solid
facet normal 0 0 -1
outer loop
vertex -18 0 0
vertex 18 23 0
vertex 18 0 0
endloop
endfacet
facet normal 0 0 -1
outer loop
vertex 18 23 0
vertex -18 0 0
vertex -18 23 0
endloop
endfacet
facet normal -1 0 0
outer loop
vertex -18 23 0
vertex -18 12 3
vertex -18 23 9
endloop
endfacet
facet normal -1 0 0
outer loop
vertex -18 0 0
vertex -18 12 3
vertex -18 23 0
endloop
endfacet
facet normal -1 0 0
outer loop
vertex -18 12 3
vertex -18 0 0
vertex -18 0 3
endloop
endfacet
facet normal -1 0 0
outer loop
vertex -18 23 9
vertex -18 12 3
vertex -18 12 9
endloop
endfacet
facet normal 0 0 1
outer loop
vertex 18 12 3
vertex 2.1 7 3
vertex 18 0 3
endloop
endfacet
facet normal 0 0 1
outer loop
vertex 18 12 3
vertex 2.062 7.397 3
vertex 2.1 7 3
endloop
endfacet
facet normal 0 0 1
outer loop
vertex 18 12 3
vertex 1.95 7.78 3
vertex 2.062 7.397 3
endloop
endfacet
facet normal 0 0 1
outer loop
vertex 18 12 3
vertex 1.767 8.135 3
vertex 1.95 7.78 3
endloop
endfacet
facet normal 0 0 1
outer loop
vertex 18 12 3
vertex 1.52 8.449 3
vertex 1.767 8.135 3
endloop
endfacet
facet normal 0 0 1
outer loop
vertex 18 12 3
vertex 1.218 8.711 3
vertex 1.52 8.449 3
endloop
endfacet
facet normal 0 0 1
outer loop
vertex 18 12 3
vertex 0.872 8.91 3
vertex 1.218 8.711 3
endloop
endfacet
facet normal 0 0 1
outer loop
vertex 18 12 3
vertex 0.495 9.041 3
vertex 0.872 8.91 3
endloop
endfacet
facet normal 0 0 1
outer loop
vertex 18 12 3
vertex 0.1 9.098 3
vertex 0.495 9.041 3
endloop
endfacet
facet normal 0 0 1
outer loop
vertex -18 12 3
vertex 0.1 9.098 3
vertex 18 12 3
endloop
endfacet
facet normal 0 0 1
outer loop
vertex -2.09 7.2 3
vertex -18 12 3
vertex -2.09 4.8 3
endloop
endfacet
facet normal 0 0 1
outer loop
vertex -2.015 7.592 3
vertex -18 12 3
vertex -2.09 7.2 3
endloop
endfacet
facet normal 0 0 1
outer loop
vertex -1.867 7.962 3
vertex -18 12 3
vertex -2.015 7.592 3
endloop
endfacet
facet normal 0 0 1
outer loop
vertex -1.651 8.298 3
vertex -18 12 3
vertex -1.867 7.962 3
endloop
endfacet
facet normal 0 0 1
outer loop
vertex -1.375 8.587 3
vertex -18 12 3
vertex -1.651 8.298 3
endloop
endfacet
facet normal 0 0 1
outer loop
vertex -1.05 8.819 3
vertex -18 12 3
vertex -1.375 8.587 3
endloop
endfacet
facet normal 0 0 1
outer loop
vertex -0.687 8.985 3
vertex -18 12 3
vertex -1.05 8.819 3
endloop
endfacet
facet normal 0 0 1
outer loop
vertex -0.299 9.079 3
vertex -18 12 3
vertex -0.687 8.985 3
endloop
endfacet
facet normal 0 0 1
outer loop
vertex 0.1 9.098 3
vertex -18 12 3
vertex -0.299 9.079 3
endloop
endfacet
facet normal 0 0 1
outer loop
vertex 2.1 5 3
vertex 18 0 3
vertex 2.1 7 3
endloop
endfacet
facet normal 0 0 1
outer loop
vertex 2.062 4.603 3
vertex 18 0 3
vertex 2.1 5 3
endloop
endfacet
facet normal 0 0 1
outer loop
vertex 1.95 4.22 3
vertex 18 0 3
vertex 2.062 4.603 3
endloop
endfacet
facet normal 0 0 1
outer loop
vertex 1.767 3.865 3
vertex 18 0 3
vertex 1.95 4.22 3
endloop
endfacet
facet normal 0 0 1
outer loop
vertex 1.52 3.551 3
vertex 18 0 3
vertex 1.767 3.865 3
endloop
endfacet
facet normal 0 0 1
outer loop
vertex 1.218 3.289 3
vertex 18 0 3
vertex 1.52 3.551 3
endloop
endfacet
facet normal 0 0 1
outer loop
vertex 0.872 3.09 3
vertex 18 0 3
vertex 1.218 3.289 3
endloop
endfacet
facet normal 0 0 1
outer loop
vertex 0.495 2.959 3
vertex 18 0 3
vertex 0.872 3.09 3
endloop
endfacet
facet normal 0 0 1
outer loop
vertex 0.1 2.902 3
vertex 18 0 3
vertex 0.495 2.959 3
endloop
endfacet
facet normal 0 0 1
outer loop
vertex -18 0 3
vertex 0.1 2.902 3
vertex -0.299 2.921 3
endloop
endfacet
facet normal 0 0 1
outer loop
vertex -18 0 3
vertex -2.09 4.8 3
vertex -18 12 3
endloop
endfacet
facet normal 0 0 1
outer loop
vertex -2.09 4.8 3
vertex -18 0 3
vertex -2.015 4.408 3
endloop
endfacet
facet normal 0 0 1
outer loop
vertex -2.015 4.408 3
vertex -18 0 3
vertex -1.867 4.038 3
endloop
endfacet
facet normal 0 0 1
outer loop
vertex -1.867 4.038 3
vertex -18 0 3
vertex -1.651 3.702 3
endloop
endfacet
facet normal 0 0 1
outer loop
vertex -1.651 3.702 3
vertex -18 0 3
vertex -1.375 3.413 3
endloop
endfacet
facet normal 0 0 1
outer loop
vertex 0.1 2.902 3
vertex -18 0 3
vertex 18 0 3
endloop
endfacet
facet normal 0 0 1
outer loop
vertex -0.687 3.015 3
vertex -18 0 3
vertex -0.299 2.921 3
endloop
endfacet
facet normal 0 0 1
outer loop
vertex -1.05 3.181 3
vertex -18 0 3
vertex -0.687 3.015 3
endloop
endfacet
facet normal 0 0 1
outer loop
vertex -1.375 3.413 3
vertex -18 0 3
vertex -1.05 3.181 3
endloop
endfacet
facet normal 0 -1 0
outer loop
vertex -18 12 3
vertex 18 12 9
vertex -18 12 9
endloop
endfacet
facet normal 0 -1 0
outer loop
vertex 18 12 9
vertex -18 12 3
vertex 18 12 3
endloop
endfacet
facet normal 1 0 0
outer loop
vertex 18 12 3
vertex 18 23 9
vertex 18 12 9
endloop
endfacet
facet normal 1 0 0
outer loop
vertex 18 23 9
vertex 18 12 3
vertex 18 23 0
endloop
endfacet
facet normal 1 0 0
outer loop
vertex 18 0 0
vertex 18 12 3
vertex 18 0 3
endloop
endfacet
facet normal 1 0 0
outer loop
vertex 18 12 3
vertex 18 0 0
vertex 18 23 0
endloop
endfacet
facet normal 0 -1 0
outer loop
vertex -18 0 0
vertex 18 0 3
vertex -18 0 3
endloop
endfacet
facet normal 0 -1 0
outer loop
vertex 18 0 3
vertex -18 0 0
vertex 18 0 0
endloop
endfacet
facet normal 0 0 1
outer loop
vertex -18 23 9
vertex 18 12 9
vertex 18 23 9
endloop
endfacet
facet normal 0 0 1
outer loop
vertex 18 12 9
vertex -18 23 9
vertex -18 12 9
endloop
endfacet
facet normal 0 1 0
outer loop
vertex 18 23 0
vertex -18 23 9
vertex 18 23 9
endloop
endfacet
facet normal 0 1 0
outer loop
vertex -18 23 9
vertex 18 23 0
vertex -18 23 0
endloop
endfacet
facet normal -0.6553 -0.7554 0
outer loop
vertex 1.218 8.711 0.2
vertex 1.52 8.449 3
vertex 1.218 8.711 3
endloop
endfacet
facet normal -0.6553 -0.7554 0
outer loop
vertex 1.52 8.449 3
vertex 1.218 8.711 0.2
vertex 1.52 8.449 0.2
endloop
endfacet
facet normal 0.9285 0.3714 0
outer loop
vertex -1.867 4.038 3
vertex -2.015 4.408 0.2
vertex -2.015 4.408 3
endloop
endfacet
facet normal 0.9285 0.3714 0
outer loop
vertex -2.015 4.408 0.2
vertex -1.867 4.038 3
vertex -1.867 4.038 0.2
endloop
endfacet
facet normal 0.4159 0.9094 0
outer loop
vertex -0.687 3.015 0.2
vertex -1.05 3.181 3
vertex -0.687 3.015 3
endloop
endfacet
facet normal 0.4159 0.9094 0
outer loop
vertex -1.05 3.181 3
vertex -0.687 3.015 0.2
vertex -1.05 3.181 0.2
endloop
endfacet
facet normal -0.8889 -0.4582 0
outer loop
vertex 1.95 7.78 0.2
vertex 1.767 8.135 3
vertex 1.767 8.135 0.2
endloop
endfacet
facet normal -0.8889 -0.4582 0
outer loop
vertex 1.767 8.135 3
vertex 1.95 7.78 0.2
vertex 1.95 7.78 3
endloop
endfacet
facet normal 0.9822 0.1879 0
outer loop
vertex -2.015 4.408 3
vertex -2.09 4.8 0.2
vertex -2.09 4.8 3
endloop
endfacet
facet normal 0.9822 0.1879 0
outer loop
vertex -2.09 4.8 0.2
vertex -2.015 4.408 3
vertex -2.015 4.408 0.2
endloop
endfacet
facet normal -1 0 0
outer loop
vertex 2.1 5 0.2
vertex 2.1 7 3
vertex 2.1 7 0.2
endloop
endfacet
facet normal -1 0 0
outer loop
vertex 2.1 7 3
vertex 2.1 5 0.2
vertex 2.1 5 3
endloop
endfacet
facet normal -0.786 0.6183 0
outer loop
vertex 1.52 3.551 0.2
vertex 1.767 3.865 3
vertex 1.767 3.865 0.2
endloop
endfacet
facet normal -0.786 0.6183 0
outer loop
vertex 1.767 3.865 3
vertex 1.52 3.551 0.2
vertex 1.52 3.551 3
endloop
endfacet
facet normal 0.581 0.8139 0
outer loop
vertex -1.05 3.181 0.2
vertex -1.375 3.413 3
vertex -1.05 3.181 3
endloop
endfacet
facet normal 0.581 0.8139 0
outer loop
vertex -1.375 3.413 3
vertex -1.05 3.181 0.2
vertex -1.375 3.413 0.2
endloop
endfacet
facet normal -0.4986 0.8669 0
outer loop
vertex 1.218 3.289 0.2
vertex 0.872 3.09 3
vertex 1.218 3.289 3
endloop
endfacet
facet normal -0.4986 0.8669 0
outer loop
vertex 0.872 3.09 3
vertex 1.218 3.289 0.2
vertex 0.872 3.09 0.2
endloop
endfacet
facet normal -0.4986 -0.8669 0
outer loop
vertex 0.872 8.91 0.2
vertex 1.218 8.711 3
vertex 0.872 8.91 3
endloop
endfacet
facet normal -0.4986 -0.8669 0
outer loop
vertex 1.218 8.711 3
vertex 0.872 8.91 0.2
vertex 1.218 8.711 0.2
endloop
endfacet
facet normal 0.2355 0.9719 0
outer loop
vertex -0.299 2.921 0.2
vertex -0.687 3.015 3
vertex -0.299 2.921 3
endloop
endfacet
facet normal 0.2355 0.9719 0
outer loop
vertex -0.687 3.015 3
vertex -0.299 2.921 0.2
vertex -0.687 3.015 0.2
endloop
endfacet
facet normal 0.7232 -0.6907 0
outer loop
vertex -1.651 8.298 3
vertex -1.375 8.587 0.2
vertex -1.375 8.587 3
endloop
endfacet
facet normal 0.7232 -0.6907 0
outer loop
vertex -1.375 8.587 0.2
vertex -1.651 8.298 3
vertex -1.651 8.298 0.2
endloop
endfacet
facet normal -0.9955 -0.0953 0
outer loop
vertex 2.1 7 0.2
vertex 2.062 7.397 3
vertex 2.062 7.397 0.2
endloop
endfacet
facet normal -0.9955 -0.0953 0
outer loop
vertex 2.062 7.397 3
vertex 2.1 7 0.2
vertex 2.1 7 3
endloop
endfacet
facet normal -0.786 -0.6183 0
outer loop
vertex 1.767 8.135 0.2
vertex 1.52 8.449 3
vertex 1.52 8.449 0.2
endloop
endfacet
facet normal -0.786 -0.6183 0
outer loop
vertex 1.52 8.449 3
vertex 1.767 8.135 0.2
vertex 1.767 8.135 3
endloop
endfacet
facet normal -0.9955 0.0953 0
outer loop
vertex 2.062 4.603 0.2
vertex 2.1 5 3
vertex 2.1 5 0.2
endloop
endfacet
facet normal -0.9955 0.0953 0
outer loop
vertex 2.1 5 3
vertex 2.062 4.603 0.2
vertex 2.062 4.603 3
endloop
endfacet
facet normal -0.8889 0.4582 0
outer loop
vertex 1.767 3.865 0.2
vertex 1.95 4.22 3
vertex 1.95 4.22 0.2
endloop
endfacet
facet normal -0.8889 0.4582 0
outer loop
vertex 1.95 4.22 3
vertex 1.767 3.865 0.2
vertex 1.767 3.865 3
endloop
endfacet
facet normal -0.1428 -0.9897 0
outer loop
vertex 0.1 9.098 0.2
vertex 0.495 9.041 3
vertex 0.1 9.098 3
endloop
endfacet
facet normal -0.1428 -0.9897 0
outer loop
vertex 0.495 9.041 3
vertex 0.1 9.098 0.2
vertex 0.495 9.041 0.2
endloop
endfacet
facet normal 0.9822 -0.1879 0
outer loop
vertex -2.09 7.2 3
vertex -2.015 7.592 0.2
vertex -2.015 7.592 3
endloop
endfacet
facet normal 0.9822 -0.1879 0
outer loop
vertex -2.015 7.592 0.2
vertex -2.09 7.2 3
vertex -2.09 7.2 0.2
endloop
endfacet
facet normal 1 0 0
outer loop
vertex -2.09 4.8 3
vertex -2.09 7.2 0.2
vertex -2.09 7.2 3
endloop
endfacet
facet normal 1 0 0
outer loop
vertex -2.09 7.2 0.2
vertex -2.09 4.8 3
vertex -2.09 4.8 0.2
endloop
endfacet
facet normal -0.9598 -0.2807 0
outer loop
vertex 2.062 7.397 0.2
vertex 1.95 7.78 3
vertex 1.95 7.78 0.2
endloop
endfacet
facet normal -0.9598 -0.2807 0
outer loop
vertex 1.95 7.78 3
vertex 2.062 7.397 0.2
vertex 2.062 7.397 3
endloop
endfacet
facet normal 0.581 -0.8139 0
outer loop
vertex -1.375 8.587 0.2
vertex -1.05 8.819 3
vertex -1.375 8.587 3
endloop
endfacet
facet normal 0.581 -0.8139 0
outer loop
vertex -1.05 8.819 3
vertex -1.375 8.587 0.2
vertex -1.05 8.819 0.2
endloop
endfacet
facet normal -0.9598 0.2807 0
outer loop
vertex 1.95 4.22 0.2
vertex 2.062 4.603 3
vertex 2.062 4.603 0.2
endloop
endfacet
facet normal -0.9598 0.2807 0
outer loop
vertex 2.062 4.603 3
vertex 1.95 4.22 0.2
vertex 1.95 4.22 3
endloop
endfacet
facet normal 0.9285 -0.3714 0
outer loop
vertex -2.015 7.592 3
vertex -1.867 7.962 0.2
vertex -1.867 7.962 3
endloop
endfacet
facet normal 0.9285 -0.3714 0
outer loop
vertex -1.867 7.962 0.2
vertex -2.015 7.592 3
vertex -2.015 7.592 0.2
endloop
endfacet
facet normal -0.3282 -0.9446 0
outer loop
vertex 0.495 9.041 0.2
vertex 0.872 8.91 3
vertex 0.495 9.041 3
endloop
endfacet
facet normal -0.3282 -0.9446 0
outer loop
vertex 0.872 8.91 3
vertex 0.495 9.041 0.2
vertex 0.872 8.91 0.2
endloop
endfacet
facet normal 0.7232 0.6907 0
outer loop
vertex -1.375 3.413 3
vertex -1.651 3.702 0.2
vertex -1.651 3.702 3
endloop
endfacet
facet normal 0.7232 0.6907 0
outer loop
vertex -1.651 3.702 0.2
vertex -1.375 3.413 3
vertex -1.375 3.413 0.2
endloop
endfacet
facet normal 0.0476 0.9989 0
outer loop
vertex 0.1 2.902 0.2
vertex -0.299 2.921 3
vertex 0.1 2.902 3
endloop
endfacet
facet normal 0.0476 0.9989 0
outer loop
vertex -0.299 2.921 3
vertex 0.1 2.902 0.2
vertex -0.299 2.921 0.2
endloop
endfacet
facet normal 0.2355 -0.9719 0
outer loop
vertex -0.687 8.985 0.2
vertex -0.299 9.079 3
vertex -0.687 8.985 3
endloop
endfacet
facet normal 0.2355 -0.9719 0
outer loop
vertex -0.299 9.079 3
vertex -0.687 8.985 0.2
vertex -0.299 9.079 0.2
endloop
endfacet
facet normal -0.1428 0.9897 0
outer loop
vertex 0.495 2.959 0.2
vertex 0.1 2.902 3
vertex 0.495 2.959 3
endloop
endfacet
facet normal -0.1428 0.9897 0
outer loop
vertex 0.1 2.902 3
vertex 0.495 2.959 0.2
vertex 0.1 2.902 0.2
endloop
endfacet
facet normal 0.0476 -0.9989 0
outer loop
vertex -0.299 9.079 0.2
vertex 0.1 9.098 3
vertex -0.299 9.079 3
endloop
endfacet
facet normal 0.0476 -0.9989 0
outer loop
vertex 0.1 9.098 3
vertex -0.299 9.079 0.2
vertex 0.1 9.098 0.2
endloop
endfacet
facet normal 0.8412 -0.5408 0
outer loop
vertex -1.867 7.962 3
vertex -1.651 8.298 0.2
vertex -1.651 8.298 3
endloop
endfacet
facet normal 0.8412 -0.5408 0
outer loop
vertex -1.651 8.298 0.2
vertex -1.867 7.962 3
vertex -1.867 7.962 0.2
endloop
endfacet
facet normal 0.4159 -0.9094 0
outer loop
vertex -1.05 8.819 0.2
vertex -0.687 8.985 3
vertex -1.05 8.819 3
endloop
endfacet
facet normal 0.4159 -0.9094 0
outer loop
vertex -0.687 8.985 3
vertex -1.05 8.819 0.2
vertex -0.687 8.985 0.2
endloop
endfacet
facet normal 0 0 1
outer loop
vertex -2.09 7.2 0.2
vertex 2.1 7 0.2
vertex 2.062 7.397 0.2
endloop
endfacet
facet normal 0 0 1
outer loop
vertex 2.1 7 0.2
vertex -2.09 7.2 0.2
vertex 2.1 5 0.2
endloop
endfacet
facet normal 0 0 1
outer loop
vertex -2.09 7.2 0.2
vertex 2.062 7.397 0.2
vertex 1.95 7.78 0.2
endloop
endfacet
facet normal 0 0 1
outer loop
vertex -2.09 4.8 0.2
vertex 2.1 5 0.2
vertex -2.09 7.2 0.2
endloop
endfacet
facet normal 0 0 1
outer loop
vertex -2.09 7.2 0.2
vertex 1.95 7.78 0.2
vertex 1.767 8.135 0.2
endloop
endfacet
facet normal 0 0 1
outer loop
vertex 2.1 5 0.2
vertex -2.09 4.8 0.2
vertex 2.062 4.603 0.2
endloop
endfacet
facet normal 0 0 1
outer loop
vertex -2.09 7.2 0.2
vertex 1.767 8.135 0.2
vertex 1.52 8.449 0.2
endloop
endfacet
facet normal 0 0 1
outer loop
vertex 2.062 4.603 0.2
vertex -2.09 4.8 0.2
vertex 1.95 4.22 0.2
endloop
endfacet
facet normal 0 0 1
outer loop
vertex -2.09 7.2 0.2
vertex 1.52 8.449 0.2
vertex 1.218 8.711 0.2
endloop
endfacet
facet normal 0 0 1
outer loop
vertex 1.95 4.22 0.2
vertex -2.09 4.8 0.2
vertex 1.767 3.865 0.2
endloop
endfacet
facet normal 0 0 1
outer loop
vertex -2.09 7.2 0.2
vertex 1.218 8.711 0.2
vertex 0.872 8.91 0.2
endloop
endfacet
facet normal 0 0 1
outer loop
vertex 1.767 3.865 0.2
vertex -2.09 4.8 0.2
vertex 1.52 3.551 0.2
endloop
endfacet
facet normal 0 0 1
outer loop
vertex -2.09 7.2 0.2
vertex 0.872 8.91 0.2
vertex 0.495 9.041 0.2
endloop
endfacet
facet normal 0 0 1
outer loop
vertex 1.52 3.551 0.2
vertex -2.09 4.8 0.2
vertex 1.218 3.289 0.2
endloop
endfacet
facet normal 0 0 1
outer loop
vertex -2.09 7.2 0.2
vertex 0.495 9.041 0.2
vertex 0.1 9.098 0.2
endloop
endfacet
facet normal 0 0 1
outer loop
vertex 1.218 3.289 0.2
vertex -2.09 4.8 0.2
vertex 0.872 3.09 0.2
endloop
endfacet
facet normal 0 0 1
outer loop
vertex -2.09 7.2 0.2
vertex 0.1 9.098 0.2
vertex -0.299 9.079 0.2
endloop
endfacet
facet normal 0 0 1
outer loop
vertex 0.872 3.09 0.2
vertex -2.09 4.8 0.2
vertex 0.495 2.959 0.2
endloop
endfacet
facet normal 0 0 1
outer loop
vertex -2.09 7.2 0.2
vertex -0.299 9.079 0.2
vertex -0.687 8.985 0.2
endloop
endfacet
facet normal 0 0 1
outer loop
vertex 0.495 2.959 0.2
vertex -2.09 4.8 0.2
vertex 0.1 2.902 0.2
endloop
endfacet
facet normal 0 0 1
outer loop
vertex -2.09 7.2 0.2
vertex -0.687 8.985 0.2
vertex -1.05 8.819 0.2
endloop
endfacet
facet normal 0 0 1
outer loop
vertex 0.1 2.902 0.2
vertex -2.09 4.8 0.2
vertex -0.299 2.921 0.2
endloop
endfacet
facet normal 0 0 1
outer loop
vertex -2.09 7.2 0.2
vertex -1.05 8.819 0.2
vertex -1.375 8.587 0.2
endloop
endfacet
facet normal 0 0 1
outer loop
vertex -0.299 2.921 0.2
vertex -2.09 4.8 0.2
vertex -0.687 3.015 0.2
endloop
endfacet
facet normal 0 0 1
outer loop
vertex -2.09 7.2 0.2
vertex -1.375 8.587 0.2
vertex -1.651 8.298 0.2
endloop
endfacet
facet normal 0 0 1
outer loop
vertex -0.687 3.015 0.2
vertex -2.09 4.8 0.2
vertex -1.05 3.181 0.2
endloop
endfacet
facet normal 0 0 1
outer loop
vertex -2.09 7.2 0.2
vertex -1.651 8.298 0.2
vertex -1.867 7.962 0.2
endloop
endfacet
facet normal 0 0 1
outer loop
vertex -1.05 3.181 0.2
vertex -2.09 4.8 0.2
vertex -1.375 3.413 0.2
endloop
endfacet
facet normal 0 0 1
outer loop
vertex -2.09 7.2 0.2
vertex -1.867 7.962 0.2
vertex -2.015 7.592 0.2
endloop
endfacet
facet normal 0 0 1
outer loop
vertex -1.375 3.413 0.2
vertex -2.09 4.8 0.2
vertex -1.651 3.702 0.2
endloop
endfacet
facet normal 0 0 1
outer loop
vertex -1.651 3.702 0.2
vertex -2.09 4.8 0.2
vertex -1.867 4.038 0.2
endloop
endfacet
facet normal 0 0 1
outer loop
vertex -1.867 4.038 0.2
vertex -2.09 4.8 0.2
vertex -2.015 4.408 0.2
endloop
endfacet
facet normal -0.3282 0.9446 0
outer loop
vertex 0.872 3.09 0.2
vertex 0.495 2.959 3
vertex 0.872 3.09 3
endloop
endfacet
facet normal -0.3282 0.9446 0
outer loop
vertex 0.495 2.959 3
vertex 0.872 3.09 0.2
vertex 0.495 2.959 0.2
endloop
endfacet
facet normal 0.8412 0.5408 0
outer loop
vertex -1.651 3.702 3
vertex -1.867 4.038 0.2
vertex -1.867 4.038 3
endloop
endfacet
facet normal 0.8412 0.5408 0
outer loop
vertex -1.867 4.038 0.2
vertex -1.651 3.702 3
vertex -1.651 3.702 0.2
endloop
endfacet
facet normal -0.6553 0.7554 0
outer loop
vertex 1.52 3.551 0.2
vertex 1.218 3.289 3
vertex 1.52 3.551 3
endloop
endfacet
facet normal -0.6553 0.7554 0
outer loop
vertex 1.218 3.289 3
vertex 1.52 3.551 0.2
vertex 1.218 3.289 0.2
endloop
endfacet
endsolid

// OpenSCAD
//$fn=60;
$fa=5;
$fs=.4;

m4screwhole = 4.2;

main();

module main(){
    difference(){
        body_all();
        holes();
    }
}

module body_all(){
    linear_extrude(height=3) translate([-18,0,0]) square([36,12]);
    linear_extrude(height=9) translate([-18,12,0]) square([36,11]);
}

module holes(){
    translate([0,6,0.2]) linear_extrude(height=10) hull(){
        translate([0,1,0]) circle(d=m4screwhole);
        translate([0,-1,0]) circle(d=m4screwhole);
    }
}
